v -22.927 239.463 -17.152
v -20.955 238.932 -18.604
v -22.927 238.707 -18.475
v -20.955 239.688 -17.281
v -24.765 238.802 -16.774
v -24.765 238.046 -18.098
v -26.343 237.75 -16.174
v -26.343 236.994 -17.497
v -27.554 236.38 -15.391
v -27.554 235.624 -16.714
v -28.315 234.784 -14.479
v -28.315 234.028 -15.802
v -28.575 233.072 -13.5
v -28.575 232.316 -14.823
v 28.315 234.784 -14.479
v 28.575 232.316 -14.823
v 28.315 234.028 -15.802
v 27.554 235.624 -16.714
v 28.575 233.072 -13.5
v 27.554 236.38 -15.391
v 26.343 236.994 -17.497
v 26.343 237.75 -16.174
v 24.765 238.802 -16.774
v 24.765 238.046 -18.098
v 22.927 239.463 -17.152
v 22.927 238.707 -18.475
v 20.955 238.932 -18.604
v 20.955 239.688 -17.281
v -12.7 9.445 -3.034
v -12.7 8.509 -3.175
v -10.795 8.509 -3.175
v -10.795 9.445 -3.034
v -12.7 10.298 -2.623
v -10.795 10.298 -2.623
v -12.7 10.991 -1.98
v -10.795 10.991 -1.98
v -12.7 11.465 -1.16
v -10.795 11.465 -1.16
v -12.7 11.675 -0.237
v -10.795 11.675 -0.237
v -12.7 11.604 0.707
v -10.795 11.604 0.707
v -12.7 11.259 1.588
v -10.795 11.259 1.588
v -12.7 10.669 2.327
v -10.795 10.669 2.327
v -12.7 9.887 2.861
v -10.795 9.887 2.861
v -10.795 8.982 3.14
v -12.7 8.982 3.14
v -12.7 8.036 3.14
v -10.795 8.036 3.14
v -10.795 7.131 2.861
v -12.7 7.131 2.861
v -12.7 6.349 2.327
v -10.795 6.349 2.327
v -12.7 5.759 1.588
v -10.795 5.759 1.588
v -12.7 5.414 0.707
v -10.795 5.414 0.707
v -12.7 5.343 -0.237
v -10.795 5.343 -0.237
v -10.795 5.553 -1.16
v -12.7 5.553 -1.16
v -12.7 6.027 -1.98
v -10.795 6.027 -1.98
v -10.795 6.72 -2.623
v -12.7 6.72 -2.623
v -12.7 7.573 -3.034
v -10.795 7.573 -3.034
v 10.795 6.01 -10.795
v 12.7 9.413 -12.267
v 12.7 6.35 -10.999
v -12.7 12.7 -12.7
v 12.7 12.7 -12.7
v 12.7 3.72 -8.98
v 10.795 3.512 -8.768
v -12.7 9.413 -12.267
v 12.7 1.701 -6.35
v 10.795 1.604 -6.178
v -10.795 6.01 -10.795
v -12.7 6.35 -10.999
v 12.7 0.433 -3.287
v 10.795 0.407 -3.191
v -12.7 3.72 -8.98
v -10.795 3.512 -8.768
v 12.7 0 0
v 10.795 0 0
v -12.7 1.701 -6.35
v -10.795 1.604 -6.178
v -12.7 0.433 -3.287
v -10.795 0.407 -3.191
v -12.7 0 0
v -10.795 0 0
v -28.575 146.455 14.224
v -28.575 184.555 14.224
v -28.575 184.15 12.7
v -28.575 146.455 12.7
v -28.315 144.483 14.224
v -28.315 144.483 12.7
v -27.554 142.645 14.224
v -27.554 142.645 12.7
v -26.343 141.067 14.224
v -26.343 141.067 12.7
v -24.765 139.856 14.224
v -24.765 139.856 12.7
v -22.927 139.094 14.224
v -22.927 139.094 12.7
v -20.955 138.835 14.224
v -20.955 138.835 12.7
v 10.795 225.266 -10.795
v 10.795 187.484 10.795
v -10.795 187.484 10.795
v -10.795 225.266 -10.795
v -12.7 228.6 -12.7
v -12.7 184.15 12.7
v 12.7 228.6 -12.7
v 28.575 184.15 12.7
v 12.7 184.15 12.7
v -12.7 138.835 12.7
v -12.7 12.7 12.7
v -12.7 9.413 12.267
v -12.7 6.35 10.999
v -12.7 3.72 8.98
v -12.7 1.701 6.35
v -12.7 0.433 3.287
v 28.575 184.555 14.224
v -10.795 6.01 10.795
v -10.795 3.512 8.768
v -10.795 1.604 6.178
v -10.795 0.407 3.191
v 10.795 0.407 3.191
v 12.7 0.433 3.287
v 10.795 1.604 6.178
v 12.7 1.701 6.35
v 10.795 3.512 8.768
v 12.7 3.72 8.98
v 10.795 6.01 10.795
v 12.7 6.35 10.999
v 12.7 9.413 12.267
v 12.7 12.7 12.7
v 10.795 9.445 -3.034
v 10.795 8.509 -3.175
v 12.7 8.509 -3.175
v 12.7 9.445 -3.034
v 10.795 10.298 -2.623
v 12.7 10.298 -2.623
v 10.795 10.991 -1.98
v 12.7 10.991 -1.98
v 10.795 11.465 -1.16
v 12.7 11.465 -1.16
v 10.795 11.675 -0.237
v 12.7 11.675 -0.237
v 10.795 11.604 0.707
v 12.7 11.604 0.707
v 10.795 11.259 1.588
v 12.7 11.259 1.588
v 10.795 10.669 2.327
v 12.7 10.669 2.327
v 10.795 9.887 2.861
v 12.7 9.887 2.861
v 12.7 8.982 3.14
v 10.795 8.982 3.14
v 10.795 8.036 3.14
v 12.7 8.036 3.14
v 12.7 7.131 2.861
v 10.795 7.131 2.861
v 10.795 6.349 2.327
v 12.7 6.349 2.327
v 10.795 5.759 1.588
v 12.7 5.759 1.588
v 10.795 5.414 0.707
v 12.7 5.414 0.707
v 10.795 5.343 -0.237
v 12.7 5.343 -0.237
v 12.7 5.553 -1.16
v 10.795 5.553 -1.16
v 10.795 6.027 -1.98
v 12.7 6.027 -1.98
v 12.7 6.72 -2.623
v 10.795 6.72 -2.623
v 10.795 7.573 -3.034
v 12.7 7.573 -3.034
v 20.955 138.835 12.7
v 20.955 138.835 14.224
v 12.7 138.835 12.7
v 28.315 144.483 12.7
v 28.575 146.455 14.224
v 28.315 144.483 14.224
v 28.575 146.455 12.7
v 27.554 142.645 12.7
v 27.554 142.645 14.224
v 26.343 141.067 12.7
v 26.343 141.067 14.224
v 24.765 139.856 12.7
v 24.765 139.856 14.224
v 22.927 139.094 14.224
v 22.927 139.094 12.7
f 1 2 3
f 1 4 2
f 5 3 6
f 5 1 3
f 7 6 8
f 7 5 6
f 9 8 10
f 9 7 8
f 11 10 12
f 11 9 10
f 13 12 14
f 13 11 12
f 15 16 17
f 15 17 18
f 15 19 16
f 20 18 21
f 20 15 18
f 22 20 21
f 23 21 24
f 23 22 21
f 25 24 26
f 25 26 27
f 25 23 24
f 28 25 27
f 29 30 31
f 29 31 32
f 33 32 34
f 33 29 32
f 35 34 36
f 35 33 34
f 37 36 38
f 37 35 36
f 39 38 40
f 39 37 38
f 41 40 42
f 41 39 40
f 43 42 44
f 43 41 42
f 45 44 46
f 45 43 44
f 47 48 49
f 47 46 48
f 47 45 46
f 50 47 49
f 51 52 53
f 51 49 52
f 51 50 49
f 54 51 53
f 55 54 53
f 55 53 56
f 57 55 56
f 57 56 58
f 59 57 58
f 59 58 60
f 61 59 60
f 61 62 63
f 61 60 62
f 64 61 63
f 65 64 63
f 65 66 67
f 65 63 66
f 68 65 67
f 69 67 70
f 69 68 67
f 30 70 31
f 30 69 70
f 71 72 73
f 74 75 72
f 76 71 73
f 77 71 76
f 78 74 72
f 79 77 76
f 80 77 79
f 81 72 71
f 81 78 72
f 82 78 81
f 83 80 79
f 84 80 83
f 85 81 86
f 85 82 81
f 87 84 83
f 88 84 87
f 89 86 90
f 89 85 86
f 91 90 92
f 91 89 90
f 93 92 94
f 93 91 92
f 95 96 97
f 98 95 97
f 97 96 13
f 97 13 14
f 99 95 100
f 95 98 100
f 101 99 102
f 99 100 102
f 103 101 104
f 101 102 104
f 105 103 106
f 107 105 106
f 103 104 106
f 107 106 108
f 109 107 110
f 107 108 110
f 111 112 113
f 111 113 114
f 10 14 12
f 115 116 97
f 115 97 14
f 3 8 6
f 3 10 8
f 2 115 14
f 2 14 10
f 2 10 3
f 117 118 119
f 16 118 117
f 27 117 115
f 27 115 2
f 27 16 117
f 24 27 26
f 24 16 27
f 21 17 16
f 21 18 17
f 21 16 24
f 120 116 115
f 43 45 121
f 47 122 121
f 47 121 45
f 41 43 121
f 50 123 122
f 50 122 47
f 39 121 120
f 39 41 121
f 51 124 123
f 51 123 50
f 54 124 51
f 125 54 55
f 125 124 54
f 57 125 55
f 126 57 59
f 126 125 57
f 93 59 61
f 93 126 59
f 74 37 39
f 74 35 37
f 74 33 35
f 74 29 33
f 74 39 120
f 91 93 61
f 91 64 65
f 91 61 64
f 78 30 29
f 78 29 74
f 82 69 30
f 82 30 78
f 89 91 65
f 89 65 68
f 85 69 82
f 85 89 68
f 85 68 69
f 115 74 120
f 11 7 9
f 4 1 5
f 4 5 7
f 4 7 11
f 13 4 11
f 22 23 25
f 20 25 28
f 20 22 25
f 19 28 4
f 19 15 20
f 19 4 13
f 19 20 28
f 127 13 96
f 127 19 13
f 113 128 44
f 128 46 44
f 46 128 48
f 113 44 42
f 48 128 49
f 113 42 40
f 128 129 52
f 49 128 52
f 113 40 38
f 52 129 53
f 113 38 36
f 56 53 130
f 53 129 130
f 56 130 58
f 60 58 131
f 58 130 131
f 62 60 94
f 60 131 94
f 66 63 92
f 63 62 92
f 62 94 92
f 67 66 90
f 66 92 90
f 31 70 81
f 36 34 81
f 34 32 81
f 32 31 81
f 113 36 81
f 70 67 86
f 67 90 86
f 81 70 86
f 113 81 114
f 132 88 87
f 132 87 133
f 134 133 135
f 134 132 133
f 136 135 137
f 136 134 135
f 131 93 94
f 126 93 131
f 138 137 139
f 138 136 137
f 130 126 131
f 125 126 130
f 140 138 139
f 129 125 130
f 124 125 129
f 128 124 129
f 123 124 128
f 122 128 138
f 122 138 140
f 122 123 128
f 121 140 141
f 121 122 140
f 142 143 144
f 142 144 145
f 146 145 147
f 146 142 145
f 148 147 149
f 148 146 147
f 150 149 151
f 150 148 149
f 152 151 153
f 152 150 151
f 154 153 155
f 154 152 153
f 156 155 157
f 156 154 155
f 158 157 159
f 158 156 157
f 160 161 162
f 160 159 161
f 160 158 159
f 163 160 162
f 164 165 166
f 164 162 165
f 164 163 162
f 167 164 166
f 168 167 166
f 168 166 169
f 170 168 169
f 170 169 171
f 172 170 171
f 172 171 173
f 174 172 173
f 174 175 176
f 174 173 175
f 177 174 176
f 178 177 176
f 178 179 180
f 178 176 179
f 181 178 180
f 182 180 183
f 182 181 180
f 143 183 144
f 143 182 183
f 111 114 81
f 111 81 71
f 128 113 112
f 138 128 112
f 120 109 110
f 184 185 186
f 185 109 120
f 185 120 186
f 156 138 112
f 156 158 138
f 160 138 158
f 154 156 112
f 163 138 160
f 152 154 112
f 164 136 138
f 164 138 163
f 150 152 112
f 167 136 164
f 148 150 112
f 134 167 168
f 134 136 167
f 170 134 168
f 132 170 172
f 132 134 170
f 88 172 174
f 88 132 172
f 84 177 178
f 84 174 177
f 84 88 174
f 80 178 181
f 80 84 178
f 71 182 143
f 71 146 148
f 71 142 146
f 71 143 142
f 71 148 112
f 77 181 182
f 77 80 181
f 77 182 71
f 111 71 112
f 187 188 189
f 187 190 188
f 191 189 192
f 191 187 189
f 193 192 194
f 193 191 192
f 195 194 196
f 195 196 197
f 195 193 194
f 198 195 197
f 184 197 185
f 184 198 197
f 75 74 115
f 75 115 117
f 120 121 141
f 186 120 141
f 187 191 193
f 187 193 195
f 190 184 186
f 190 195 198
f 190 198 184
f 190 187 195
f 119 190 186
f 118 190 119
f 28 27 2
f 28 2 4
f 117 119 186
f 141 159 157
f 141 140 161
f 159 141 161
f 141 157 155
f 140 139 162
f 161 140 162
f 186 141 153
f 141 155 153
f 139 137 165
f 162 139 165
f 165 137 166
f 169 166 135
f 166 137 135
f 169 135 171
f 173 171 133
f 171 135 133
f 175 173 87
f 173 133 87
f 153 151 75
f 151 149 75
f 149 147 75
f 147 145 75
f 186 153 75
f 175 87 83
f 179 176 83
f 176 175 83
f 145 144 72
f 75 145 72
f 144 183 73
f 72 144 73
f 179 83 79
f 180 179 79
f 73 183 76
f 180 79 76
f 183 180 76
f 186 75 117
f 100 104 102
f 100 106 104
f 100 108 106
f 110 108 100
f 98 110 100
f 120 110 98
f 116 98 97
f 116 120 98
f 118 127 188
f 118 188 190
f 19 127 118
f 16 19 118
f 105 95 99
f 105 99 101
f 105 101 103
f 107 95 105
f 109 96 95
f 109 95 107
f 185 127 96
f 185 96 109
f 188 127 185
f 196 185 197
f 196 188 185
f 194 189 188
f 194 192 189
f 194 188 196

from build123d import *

# Parameters (mm, degrees)
SKETCH1_W               = 25.4
SKETCH1_H               = 25.4
SKETCH1_W_2             = 21.59
SKETCH1_H_2             = 21.59
BOSS_EXTRUDE1_DEPTH     = 228.6
CUT_EXTRUDE1_DEPTH      = 230.304470083
CUT_EXTRUDE1_DEPTH_BACK = 230.304470083
SKETCH2_R               = 3.175
BOSS_EXTRUDE2_DEPTH     = 28.575
FILLET1_R               = 7.62


with BuildPart() as part:
    # Sketch1 → Boss-Extrude1 (new body)
    with BuildSketch(Plane(origin=(0, 0, 0), x_dir=(1, 0, 0), z_dir=(0, 1, 0))):
        Rectangle(SKETCH1_W, SKETCH1_H)
        Rectangle(SKETCH1_W_2, SKETCH1_H_2, mode=Mode.SUBTRACT)
    extrude(amount=BOSS_EXTRUDE1_DEPTH)

    # Sketch2 → Cut-Extrude1 (cut, two sides: drawn at the far end of the back side and taken through both)
    with BuildSketch(Plane(origin=(0, 0, 0), x_dir=(0, 0, -1), z_dir=(1, 0, 0)).offset(-CUT_EXTRUDE1_DEPTH_BACK)):
        Polygon((-12.7, 228.6), (-12.7, 184.15), (12.7, 228.6), align=None)
        with BuildLine():
            Line((-12.7, 0), (0, 0))
            ThreePointArc((0, 0), (-8.980256121, 3.719743879), (-12.7, 12.7))
            Line((-12.7, 12.7), (-12.7, 0))
        make_face()
        with BuildLine():
            ThreePointArc((12.7, 12.7), (8.980256121, 3.719743879), (0, 0))
            Line((0, 0), (12.7, 0))
            Line((12.7, 0), (12.7, 12.7))
        make_face()
        with Locations((0, 8.509)):
            Circle(SKETCH2_R)
    extrude(amount=CUT_EXTRUDE1_DEPTH + CUT_EXTRUDE1_DEPTH_BACK, mode=Mode.SUBTRACT)

    # Sketch3 → Boss-Extrude2 (add, symmetric)
    with BuildSketch(Plane(origin=(0, 0, 0), x_dir=(0, 0, -1), z_dir=(1, 0, 0))):
        Polygon((-12.7, 184.15), (18.604025134, 238.932043985), (17.280822586, 239.688159727), (-14.224, 184.554720202), (-14.224, 138.834720202), (-12.7, 138.834720202), align=None)
    extrude(amount=BOSS_EXTRUDE2_DEPTH, both=True)

    # Fillet1
    fillet1_edges = [part.edges().sort_by_distance(p)[0] for p in [
        (-28.575, 239.310101856, -17.94242386),
        (-28.575, 138.834720202, 13.462),
        (28.575, 239.310101856, -17.94242386),
        (28.575, 138.834720202, 13.462),
    ]]
    fillet(fillet1_edges, radius=FILLET1_R)


solid = part.part
